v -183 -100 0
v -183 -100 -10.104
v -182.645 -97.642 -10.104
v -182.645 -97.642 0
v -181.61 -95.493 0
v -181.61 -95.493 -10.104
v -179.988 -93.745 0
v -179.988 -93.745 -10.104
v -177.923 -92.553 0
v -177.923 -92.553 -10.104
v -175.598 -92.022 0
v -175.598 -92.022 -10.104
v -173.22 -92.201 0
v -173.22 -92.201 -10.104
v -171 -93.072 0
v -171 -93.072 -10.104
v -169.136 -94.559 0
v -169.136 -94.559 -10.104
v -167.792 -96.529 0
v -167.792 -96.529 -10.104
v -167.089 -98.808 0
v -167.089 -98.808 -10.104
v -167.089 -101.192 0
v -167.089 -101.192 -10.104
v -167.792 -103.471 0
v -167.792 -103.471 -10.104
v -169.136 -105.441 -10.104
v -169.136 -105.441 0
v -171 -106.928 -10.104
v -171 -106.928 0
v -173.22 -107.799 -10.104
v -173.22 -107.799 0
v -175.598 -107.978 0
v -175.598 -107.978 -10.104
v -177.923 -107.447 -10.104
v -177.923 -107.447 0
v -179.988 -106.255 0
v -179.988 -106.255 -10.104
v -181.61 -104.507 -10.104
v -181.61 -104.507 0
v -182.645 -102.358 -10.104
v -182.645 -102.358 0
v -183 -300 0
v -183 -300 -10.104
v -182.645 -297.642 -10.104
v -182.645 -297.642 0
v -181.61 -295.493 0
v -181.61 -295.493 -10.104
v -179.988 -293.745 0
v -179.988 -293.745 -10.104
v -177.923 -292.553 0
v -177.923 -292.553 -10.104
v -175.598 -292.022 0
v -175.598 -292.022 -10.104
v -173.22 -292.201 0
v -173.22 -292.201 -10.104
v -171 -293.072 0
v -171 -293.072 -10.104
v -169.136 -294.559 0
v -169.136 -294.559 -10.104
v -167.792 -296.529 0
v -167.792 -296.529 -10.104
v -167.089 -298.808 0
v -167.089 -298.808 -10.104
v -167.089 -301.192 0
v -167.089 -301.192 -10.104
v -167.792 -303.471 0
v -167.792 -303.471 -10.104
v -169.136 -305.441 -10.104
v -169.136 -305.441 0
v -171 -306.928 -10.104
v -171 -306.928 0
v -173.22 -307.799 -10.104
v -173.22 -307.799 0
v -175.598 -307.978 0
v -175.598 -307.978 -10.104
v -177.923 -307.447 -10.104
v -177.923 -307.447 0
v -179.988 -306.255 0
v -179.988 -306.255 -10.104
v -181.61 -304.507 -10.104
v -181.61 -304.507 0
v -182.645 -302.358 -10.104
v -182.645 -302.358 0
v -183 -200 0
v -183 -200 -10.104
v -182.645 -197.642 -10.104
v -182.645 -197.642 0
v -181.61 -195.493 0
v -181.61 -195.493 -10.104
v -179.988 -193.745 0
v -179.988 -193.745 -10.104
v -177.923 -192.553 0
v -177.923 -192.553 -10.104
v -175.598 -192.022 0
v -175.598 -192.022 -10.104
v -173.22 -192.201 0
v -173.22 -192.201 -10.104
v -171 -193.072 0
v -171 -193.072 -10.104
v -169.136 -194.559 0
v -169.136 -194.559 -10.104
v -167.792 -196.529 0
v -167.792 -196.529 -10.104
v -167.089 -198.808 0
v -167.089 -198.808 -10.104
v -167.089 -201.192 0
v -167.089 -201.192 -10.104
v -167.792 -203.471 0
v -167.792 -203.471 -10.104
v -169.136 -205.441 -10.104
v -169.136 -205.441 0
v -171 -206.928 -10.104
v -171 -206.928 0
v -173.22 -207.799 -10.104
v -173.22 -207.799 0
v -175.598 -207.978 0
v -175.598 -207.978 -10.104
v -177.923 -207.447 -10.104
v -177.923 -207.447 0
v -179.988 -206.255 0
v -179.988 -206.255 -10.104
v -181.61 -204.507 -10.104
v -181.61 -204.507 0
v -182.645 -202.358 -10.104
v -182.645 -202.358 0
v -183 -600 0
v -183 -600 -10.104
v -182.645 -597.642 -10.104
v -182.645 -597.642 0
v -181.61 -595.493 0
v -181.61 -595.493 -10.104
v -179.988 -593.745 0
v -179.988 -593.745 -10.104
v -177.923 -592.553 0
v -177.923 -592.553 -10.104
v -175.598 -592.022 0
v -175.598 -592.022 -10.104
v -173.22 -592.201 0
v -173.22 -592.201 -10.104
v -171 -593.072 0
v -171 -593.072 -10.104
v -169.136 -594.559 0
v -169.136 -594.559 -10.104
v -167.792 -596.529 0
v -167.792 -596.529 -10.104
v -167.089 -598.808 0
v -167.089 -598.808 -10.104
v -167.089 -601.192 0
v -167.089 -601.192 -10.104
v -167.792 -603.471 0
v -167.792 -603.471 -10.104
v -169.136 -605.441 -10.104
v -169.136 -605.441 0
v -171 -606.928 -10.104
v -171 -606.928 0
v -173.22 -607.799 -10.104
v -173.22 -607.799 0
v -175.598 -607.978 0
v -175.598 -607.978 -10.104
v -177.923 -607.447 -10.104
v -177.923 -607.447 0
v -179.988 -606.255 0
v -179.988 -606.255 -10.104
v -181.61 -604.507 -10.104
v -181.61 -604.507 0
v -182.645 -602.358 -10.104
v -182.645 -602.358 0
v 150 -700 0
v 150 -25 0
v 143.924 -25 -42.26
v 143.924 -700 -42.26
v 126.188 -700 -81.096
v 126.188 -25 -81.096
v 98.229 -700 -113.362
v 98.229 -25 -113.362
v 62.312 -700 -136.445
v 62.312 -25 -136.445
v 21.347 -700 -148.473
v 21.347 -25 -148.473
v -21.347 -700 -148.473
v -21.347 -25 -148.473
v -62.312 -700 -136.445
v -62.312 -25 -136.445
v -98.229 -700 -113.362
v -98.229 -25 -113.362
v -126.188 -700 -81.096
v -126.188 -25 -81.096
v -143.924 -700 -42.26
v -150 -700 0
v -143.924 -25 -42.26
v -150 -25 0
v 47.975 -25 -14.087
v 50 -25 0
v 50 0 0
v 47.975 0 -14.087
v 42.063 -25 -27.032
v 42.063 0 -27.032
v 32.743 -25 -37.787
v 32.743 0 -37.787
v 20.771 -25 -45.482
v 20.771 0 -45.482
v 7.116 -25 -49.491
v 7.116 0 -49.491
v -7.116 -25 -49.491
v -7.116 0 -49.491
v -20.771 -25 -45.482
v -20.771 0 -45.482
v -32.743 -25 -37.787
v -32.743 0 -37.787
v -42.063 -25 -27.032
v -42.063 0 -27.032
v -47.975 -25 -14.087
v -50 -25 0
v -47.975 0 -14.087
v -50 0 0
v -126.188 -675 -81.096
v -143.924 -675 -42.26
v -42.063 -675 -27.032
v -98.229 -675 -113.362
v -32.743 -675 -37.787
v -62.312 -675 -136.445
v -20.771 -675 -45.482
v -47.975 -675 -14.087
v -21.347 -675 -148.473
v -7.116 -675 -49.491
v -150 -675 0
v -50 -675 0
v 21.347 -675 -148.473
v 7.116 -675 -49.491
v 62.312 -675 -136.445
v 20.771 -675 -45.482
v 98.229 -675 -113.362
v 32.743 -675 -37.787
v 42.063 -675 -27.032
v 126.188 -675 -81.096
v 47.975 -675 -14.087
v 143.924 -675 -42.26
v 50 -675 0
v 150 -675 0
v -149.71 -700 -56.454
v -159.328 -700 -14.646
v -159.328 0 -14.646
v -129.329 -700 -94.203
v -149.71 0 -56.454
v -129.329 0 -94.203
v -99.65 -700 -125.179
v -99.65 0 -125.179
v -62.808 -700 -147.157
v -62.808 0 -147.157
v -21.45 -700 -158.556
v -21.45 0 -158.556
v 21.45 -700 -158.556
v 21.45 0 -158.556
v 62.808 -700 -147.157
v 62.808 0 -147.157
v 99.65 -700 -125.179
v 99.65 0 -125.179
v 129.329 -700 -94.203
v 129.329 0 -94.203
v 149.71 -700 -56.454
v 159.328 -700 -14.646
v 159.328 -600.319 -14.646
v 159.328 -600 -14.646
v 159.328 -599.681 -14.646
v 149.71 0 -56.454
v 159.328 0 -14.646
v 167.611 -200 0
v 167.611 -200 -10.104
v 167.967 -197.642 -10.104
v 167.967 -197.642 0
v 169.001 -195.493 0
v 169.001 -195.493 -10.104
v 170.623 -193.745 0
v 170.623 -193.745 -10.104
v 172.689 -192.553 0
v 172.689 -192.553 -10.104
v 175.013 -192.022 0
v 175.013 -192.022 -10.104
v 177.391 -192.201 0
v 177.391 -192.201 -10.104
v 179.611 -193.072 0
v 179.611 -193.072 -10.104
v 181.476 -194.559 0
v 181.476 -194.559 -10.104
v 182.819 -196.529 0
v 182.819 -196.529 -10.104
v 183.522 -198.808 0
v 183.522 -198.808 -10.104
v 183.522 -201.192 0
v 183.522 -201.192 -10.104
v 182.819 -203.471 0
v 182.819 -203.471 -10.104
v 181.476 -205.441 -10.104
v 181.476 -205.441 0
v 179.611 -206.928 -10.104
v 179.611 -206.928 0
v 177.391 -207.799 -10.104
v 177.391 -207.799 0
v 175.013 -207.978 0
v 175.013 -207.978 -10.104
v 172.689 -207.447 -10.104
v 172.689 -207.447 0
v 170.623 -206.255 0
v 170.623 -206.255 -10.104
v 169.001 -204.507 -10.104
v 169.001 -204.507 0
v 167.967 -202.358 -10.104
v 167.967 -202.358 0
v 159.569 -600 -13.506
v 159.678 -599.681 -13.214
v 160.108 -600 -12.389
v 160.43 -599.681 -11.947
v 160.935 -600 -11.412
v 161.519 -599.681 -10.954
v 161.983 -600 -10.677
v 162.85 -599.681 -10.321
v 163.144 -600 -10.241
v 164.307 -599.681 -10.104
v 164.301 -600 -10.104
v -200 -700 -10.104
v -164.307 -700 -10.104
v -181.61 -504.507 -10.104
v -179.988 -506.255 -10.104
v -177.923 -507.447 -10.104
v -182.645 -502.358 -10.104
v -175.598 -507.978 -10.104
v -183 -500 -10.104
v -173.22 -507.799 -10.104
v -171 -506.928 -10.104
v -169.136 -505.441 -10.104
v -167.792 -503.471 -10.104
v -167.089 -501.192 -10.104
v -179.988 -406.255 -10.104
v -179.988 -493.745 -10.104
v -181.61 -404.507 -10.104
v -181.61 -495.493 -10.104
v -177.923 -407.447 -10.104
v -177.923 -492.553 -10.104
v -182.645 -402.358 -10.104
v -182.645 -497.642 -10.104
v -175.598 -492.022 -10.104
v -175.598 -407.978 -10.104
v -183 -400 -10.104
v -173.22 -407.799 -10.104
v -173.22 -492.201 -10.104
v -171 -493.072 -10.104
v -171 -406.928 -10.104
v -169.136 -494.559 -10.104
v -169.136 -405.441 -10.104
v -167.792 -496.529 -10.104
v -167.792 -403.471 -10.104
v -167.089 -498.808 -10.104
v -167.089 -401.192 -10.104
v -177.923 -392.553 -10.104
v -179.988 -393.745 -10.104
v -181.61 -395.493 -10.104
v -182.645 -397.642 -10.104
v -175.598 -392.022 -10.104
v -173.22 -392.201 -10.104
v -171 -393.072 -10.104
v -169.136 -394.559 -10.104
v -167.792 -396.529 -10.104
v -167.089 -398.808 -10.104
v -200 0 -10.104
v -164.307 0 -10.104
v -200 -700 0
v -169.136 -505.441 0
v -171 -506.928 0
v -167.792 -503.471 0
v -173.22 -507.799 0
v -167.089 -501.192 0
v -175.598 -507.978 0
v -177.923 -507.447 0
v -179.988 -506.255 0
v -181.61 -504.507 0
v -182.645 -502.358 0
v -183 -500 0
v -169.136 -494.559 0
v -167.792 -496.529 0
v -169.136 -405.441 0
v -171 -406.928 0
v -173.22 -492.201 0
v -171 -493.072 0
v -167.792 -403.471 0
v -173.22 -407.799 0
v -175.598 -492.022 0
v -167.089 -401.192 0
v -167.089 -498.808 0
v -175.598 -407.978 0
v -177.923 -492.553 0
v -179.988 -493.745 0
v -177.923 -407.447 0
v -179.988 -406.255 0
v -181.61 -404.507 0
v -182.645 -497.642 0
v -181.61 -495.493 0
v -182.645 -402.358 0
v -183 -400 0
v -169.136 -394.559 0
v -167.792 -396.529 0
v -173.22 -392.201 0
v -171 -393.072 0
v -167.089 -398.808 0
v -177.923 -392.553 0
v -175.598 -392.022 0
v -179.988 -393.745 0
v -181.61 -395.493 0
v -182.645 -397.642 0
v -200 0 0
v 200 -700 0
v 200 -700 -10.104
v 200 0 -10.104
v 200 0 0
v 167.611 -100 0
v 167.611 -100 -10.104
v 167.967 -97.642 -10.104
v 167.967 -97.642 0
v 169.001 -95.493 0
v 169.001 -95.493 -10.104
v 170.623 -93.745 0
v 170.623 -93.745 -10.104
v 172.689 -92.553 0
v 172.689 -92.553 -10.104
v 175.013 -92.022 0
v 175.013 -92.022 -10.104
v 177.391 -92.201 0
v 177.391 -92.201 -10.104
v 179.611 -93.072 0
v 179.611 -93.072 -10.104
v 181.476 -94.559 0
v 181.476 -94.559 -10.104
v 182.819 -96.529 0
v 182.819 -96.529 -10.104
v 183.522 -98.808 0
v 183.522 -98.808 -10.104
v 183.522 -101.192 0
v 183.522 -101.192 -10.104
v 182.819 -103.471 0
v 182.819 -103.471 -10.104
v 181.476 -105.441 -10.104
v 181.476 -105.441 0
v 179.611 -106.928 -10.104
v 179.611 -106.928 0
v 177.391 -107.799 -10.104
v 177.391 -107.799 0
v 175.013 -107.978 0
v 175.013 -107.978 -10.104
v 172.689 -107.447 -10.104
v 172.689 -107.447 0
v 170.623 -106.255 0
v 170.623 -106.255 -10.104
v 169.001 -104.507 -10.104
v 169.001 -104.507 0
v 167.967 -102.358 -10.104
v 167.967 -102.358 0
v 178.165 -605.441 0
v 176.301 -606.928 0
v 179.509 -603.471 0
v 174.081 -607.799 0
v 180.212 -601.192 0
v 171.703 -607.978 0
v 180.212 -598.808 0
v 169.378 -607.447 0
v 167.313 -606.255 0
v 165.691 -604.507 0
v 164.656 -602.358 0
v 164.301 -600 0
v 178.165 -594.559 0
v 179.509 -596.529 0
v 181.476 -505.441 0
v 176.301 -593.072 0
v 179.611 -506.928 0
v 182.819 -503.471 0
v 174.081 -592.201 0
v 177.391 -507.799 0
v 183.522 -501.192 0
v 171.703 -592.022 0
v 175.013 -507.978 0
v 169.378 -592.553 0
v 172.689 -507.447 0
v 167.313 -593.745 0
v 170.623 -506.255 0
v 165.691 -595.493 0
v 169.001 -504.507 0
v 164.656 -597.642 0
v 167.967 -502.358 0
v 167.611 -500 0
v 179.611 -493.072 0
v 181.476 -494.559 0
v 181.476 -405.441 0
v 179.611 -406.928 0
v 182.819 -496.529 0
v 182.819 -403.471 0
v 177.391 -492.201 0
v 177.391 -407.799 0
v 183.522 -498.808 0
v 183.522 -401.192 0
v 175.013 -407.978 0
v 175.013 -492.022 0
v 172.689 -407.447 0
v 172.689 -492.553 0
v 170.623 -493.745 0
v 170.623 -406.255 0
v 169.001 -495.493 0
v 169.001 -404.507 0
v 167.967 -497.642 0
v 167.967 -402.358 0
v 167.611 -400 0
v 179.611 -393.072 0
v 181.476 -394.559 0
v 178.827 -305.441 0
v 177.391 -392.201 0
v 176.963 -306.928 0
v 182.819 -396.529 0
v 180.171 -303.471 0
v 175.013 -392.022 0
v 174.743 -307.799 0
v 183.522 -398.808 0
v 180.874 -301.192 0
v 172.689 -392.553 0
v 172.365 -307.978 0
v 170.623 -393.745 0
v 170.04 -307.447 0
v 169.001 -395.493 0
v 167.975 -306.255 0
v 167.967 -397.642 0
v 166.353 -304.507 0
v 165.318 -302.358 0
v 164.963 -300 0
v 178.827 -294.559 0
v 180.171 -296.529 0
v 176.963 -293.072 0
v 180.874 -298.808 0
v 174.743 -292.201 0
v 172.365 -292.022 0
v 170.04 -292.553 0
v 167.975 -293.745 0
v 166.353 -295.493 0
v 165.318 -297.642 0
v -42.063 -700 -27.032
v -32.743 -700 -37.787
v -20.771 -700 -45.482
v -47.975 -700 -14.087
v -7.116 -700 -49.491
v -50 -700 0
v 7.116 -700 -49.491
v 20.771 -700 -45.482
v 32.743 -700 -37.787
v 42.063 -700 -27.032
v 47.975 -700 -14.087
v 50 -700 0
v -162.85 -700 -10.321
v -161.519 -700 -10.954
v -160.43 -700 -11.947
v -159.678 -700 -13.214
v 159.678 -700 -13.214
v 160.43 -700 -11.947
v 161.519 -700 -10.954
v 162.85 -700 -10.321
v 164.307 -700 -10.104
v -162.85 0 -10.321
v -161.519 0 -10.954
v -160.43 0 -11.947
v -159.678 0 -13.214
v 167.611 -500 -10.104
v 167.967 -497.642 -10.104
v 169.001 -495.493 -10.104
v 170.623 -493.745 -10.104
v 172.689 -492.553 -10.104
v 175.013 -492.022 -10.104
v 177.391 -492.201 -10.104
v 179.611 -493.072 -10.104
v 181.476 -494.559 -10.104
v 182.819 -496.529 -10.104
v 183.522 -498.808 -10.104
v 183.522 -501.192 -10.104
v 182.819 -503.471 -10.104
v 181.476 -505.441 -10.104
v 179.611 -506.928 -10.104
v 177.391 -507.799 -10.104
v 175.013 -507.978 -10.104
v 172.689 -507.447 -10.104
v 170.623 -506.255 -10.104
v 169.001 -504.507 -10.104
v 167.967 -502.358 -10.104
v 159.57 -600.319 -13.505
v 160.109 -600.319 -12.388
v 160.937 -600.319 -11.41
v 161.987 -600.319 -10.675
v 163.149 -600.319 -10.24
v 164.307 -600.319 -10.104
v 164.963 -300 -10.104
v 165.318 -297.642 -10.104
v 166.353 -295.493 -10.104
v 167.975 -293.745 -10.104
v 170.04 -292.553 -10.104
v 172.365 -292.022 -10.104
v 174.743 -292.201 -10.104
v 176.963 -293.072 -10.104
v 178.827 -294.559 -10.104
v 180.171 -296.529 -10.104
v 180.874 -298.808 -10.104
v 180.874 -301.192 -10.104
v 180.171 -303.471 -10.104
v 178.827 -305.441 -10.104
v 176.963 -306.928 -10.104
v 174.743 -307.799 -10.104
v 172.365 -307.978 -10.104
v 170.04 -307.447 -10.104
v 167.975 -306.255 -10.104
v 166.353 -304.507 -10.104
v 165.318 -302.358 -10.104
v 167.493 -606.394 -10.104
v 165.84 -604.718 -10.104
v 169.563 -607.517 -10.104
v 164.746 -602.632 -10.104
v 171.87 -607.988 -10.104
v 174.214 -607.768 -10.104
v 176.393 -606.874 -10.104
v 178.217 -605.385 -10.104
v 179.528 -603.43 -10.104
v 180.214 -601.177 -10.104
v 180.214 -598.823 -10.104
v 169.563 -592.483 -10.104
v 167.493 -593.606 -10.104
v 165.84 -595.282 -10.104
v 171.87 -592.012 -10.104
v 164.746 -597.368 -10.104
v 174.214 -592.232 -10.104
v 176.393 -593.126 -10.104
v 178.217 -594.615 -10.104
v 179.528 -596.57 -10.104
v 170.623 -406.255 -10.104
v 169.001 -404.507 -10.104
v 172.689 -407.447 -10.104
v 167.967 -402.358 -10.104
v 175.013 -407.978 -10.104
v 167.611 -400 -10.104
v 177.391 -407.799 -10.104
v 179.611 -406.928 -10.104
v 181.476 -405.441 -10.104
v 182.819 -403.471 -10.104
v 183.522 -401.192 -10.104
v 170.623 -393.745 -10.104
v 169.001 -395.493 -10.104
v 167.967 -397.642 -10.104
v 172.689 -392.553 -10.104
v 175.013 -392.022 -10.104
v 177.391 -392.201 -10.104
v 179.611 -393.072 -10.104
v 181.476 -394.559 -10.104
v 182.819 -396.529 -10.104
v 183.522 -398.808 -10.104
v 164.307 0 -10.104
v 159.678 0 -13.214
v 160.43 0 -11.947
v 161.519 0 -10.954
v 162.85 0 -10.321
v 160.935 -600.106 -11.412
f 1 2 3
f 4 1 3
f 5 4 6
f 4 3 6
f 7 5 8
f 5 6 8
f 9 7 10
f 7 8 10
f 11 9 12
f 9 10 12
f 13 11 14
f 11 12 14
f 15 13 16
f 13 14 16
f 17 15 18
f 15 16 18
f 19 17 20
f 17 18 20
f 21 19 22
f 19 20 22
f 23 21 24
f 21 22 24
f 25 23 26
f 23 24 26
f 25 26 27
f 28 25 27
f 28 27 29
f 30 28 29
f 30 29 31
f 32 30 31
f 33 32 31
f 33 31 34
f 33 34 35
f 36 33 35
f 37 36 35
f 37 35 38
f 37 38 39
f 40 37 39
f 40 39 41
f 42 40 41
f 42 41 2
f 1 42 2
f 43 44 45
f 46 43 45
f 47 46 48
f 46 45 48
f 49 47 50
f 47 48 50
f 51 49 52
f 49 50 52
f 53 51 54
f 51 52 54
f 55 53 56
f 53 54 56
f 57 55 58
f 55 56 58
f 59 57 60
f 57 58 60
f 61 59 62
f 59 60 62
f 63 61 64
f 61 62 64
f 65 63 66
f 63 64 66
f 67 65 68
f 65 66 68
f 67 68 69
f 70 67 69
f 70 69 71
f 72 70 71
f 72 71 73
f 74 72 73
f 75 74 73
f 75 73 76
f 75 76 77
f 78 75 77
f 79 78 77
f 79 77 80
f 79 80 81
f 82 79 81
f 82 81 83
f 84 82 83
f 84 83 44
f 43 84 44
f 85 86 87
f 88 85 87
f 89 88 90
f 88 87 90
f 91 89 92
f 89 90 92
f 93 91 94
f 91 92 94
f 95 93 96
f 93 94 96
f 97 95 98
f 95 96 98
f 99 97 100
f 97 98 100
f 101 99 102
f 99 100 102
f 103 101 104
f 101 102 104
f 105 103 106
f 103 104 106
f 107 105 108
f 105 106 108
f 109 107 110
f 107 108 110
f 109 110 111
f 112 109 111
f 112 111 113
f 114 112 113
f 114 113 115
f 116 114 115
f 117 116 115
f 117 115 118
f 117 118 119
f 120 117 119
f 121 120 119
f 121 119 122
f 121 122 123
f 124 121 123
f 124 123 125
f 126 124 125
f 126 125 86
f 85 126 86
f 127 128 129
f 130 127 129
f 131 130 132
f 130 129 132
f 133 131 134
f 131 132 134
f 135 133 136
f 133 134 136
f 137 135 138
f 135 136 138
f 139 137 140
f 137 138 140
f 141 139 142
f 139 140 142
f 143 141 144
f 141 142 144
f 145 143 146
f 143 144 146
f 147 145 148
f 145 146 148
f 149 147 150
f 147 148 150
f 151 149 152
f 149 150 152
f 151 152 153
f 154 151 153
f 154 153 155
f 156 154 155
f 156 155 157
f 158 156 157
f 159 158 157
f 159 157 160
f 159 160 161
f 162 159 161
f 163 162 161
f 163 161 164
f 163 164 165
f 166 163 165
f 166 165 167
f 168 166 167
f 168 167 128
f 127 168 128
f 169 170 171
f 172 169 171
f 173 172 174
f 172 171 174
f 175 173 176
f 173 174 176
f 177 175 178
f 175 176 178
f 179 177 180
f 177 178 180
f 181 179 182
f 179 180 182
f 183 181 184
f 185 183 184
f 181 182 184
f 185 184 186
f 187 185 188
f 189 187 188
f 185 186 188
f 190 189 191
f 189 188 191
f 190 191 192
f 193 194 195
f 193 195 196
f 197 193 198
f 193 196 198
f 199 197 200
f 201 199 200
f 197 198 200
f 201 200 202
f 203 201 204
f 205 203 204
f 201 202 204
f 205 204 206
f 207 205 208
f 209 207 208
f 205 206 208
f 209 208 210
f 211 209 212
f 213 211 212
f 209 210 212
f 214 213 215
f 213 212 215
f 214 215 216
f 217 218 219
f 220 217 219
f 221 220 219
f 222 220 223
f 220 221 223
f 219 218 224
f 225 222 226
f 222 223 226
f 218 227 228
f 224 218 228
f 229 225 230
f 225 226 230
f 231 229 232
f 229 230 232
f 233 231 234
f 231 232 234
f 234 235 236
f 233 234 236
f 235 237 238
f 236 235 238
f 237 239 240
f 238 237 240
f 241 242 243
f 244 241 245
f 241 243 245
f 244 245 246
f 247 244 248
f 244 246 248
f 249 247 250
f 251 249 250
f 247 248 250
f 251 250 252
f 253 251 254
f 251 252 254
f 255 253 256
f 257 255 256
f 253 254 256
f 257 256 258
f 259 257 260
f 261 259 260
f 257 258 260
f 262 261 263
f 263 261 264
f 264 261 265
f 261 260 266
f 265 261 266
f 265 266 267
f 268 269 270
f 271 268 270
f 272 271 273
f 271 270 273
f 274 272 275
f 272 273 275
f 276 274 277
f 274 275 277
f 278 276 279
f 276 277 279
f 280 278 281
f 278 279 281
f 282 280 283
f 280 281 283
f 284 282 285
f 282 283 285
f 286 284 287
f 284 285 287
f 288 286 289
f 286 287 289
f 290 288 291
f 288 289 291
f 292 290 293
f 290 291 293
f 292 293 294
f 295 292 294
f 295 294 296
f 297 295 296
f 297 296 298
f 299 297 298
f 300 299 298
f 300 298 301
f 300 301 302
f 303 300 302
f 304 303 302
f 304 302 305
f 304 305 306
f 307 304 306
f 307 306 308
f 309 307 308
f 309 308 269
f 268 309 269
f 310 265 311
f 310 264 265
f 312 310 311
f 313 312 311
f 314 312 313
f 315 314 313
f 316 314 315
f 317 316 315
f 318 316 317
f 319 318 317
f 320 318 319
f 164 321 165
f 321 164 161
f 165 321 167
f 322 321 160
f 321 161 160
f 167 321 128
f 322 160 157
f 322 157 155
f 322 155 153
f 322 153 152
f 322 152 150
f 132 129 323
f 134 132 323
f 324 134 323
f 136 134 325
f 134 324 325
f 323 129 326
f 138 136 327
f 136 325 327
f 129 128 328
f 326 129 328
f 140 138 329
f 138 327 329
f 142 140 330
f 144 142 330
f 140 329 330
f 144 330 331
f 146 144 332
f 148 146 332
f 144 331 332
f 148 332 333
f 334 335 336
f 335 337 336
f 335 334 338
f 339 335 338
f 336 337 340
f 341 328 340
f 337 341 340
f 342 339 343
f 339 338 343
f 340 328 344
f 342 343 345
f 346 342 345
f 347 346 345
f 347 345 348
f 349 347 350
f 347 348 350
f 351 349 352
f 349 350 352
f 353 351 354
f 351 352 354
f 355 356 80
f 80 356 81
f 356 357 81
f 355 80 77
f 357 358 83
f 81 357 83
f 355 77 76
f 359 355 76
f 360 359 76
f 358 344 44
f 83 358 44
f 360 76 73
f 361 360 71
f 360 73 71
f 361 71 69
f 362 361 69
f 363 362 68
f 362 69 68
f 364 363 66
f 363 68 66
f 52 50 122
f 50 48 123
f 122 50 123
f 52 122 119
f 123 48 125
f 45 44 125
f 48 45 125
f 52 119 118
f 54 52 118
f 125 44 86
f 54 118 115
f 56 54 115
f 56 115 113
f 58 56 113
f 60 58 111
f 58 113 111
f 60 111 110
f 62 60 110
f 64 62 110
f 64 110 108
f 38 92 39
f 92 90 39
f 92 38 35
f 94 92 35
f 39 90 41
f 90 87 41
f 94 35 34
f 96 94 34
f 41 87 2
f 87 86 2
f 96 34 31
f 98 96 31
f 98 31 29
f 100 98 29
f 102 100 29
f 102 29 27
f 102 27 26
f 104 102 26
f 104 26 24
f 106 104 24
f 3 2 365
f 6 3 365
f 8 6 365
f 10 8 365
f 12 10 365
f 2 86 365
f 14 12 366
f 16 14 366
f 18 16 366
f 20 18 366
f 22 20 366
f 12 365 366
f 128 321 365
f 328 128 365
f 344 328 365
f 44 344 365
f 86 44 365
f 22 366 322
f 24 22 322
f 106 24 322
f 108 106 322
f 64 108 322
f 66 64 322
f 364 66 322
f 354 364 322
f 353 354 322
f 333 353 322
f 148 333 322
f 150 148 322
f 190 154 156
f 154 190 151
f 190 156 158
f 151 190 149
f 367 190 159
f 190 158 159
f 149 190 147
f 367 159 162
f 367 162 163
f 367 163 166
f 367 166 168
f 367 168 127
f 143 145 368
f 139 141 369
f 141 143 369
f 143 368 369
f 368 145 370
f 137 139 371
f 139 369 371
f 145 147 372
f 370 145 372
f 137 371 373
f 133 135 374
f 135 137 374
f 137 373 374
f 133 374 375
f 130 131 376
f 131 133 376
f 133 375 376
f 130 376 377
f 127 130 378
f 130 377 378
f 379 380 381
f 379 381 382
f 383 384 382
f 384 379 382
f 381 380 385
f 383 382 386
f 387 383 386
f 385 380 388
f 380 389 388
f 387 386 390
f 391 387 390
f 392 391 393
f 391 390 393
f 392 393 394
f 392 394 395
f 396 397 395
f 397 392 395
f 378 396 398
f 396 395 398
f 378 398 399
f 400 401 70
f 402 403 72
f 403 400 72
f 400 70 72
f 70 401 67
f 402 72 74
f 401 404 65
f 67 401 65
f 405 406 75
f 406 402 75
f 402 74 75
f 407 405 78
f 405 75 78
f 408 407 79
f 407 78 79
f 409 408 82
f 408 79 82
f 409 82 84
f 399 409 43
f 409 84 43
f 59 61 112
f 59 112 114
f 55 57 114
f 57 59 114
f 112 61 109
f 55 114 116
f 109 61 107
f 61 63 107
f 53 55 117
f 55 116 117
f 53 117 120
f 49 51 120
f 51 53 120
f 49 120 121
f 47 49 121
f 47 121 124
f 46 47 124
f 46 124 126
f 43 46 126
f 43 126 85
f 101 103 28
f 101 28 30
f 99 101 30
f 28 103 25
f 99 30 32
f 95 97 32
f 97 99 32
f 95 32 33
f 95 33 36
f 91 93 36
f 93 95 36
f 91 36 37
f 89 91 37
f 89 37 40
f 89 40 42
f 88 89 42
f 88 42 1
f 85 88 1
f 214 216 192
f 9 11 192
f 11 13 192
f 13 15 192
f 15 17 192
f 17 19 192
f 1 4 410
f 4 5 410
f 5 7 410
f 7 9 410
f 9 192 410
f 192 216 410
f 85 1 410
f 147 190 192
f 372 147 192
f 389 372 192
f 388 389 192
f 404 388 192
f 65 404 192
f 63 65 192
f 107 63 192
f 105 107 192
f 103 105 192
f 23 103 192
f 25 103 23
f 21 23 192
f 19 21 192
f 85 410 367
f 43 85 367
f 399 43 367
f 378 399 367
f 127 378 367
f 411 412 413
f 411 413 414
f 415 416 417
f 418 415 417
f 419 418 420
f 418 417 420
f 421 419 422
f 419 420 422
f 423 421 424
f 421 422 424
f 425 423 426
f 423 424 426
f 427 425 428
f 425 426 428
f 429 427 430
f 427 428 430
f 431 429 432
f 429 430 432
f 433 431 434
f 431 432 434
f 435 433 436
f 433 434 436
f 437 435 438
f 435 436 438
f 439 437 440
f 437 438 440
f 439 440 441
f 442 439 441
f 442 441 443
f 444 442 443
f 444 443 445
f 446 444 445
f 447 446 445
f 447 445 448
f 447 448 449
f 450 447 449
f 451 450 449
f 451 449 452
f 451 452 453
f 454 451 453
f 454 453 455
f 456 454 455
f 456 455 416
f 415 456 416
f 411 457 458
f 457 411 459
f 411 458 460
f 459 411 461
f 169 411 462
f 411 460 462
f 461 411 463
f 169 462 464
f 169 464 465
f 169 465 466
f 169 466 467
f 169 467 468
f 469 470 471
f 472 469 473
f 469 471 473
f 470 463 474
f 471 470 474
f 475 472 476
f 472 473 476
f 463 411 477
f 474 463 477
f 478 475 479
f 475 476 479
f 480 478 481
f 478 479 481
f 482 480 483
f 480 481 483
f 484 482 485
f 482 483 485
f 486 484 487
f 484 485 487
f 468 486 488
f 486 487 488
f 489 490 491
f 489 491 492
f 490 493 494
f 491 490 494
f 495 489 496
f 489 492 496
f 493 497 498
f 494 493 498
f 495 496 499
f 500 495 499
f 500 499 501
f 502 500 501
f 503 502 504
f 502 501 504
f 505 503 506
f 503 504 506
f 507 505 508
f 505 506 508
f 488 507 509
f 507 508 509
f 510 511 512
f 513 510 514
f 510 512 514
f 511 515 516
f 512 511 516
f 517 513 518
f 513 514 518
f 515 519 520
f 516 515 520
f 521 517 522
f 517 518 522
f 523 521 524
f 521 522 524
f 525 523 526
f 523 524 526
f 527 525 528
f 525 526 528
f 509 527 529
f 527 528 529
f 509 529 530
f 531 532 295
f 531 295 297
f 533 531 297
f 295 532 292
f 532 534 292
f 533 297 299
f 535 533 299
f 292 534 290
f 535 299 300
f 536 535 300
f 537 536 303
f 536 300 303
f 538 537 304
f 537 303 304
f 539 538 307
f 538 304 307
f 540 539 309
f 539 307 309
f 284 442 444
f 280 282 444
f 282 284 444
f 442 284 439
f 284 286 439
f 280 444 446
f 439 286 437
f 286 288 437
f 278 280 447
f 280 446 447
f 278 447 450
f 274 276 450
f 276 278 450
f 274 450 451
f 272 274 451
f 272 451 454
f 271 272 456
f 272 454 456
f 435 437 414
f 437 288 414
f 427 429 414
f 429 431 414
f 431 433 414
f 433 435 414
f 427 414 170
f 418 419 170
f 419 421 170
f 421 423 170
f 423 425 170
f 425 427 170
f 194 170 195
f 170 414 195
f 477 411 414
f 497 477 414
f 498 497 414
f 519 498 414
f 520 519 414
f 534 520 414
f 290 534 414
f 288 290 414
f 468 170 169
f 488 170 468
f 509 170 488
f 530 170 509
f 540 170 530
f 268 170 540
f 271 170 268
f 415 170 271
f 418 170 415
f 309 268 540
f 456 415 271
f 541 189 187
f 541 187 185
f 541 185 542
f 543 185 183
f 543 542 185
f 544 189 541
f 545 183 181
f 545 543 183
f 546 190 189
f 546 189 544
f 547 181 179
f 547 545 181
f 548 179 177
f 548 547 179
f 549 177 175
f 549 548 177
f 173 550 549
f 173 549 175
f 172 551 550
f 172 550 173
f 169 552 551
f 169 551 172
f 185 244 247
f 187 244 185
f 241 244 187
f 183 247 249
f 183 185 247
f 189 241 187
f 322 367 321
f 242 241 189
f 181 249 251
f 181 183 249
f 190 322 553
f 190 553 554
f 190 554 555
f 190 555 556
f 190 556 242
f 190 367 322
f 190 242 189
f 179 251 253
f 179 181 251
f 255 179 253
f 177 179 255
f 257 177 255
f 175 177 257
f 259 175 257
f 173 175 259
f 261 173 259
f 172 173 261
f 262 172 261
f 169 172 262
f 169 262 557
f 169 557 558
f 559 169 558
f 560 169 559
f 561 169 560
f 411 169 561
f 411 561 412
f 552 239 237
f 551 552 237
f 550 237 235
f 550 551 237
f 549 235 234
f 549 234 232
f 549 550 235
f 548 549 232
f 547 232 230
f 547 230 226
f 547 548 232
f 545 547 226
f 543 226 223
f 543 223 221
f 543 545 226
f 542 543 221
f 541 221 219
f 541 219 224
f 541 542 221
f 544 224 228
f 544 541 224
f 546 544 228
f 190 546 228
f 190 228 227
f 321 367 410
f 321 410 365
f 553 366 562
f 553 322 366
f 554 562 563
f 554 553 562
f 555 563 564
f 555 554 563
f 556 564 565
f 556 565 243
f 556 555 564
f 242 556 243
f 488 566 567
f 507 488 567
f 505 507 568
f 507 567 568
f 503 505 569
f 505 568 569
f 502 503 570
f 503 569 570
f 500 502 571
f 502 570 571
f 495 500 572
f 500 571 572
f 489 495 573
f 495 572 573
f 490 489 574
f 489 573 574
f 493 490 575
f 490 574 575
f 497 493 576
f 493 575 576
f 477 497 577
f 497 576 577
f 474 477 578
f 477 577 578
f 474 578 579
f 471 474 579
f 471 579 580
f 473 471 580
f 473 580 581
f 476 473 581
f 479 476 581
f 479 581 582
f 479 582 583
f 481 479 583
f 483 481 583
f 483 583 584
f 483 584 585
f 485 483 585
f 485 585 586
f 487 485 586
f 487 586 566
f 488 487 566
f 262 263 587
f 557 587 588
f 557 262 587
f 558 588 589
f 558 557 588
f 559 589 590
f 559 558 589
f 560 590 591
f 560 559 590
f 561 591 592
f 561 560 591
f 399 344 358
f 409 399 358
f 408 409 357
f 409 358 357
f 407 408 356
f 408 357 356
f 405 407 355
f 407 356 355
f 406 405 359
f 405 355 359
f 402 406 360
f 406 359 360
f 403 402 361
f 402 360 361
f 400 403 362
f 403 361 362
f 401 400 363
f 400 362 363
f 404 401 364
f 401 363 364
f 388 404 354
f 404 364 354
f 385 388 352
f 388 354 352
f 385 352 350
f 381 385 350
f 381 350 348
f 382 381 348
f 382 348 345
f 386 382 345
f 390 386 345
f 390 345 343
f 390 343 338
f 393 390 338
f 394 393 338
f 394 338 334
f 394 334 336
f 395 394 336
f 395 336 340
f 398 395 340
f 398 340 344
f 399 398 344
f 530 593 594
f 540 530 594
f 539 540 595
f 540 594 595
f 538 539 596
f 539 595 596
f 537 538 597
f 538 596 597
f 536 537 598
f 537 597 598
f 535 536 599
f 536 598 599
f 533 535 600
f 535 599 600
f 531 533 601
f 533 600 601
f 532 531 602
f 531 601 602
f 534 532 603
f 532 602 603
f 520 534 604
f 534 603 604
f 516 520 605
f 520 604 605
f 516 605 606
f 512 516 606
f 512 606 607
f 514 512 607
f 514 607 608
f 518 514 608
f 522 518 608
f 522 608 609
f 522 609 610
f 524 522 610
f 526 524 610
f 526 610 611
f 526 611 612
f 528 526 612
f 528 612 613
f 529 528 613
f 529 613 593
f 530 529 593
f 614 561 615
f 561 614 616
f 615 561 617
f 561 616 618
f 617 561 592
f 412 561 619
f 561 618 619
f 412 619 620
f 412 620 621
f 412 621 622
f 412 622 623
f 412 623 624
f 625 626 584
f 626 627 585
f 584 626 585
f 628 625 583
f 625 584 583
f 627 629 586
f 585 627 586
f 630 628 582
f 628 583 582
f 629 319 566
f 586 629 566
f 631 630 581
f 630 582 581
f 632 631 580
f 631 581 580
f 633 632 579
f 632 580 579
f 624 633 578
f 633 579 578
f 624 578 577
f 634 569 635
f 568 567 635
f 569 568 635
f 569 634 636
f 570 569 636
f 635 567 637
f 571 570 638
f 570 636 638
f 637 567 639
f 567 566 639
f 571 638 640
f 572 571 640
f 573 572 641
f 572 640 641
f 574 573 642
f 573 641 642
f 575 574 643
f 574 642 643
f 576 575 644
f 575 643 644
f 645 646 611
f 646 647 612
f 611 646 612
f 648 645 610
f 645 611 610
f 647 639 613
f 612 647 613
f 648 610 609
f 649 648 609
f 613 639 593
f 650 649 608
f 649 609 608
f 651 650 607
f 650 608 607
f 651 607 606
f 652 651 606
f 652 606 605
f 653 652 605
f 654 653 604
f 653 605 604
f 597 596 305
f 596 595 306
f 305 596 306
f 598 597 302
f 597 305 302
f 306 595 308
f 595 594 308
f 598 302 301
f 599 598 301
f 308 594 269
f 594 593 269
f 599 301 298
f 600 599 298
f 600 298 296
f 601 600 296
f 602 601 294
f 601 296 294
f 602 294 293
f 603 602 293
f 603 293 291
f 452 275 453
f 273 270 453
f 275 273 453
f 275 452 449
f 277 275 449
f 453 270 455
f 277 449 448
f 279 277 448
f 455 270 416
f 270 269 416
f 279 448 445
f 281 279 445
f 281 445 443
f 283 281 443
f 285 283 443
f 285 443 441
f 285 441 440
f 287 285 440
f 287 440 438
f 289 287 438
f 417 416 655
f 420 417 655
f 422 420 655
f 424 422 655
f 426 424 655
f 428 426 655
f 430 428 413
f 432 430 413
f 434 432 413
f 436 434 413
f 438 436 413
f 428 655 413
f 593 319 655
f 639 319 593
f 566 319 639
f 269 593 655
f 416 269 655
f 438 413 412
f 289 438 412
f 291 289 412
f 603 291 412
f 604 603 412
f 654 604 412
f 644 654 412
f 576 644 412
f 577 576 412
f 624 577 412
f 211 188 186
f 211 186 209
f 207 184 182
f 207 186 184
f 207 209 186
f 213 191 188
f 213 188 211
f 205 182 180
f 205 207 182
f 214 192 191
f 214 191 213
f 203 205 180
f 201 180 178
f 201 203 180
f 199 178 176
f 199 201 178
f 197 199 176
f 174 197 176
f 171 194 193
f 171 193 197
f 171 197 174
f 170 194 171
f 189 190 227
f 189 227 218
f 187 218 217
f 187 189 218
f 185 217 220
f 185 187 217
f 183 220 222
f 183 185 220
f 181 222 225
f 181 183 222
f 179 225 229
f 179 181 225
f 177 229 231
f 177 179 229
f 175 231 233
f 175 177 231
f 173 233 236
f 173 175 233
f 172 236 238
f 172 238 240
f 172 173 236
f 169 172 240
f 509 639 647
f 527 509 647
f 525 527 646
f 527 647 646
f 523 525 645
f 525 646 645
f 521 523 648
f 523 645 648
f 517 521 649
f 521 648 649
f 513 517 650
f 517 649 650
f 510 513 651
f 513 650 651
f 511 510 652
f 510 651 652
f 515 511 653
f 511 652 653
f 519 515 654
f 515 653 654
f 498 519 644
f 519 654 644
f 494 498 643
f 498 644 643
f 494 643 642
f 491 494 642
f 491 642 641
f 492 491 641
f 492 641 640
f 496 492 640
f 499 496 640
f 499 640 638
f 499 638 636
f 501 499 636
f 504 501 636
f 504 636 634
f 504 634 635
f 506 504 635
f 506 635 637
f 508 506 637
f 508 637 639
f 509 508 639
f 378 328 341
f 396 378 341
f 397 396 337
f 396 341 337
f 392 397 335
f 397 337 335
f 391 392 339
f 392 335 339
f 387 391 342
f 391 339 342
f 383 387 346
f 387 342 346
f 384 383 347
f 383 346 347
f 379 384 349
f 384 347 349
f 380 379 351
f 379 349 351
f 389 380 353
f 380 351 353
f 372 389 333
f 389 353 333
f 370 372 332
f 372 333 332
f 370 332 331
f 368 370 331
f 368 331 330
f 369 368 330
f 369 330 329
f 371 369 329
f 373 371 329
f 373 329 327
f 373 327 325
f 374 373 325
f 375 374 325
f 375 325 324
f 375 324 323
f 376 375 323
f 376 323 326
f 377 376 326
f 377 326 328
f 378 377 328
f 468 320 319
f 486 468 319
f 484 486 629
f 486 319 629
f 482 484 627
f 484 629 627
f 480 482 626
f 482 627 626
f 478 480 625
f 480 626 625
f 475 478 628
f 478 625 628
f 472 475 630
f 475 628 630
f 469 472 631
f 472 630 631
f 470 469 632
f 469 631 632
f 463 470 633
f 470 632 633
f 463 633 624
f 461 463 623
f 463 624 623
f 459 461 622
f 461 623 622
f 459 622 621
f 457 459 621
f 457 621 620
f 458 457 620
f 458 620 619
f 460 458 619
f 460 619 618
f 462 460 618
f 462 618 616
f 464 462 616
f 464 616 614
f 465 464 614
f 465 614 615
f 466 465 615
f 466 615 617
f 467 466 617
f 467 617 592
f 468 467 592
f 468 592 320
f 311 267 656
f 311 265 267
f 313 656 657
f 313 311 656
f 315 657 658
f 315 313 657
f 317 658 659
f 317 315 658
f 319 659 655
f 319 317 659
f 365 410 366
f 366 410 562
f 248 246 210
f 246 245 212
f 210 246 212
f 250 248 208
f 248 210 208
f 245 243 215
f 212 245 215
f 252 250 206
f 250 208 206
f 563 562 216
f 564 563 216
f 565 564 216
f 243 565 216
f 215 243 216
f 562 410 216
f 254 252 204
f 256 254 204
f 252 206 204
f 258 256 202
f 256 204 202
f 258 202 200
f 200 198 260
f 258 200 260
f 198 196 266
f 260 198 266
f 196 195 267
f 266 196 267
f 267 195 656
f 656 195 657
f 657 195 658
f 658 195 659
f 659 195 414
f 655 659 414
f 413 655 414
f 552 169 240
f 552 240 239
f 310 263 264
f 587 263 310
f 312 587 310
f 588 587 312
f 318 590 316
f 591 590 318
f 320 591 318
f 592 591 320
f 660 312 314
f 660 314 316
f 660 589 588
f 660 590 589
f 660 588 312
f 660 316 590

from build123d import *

# Parameters (mm, degrees)
F1_DEPTH = 700
F2_DEPTH = 25
F4_DEPTH = 25
F7_D     = 16
F7_DEPTH = 20
F8_R     = 5


with BuildPart() as f1:
    # F0 (on Front) → F1 (new body)
    with BuildSketch(Plane.XZ):
        with BuildLine():
            ThreePointArc((150, 0), (0, -150), (-150, 0))
            Line((-150, 0), (-200, 0))
            Line((-200, 0), (-200, -10.10368))
            Line((-200, -10.10368), (-159.680668, -10.10368))
            ThreePointArc((-159.680668, -10.10368), (0, -160), (159.680668, -10.10368))
            Line((159.680668, -10.10368), (200, -10.10368))
            Line((200, -10.10368), (200, 0))
            Line((200, 0), (150, 0))
        make_face()
    extrude(amount=F1_DEPTH)

    # F0 (on Front) → F2 (join)
    with BuildSketch(Plane.XZ):
        with BuildLine():
            Line((-50, 0), (-150, 0))
            ThreePointArc((-150, 0), (0, -150), (150, 0))
            Line((150, 0), (50, 0))
            ThreePointArc((50, 0), (0, -50), (-50, 0))
        make_face()
        with BuildLine():
            ThreePointArc((150, 0), (0, -150), (-150, 0))
            Line((-150, 0), (-200, 0))
            Line((-200, 0), (-200, -10.10368))
            Line((-200, -10.10368), (-159.680668, -10.10368))
            ThreePointArc((-159.680668, -10.10368), (0, -160), (159.680668, -10.10368))
            Line((159.680668, -10.10368), (200, -10.10368))
            Line((200, -10.10368), (200, 0))
            Line((200, 0), (150, 0))
        make_face()
    extrude(amount=F2_DEPTH)

    # F7
    with Locations(Plane.XY):
        with Locations((-175, -100), (175.611329, -100), (175.611329, -200), (-175, -200), (-175, -300), (172.962989, -300), (175.611329, -400), (-175, -400), (175.611329, -500), (-175, -500), (-175, -600), (172.300905, -600)):
            Hole(F7_D / 2, depth=F7_DEPTH)

    # F8
    f8_edges = [f1.edges().sort_by_distance(p)[0] for p in [
        (159.680668, -350, -10.10368),
        (-159.680668, -350, -10.10368),
    ]]
    fillet(f8_edges, radius=F8_R)


with BuildPart() as f4:
    # F3 (on face) → F4 (new body)
    with BuildSketch(Plane.XZ.offset(700)):
        with BuildLine():
            ThreePointArc((50, 0), (0, -50), (-50, 0))
            Line((-50, 0), (-150, 0))
            ThreePointArc((-150, 0), (0, -150), (150, 0))
            Line((150, 0), (50, 0))
        make_face()
    extrude(amount=-F4_DEPTH)


solid = Compound([f1.part, f4.part])
